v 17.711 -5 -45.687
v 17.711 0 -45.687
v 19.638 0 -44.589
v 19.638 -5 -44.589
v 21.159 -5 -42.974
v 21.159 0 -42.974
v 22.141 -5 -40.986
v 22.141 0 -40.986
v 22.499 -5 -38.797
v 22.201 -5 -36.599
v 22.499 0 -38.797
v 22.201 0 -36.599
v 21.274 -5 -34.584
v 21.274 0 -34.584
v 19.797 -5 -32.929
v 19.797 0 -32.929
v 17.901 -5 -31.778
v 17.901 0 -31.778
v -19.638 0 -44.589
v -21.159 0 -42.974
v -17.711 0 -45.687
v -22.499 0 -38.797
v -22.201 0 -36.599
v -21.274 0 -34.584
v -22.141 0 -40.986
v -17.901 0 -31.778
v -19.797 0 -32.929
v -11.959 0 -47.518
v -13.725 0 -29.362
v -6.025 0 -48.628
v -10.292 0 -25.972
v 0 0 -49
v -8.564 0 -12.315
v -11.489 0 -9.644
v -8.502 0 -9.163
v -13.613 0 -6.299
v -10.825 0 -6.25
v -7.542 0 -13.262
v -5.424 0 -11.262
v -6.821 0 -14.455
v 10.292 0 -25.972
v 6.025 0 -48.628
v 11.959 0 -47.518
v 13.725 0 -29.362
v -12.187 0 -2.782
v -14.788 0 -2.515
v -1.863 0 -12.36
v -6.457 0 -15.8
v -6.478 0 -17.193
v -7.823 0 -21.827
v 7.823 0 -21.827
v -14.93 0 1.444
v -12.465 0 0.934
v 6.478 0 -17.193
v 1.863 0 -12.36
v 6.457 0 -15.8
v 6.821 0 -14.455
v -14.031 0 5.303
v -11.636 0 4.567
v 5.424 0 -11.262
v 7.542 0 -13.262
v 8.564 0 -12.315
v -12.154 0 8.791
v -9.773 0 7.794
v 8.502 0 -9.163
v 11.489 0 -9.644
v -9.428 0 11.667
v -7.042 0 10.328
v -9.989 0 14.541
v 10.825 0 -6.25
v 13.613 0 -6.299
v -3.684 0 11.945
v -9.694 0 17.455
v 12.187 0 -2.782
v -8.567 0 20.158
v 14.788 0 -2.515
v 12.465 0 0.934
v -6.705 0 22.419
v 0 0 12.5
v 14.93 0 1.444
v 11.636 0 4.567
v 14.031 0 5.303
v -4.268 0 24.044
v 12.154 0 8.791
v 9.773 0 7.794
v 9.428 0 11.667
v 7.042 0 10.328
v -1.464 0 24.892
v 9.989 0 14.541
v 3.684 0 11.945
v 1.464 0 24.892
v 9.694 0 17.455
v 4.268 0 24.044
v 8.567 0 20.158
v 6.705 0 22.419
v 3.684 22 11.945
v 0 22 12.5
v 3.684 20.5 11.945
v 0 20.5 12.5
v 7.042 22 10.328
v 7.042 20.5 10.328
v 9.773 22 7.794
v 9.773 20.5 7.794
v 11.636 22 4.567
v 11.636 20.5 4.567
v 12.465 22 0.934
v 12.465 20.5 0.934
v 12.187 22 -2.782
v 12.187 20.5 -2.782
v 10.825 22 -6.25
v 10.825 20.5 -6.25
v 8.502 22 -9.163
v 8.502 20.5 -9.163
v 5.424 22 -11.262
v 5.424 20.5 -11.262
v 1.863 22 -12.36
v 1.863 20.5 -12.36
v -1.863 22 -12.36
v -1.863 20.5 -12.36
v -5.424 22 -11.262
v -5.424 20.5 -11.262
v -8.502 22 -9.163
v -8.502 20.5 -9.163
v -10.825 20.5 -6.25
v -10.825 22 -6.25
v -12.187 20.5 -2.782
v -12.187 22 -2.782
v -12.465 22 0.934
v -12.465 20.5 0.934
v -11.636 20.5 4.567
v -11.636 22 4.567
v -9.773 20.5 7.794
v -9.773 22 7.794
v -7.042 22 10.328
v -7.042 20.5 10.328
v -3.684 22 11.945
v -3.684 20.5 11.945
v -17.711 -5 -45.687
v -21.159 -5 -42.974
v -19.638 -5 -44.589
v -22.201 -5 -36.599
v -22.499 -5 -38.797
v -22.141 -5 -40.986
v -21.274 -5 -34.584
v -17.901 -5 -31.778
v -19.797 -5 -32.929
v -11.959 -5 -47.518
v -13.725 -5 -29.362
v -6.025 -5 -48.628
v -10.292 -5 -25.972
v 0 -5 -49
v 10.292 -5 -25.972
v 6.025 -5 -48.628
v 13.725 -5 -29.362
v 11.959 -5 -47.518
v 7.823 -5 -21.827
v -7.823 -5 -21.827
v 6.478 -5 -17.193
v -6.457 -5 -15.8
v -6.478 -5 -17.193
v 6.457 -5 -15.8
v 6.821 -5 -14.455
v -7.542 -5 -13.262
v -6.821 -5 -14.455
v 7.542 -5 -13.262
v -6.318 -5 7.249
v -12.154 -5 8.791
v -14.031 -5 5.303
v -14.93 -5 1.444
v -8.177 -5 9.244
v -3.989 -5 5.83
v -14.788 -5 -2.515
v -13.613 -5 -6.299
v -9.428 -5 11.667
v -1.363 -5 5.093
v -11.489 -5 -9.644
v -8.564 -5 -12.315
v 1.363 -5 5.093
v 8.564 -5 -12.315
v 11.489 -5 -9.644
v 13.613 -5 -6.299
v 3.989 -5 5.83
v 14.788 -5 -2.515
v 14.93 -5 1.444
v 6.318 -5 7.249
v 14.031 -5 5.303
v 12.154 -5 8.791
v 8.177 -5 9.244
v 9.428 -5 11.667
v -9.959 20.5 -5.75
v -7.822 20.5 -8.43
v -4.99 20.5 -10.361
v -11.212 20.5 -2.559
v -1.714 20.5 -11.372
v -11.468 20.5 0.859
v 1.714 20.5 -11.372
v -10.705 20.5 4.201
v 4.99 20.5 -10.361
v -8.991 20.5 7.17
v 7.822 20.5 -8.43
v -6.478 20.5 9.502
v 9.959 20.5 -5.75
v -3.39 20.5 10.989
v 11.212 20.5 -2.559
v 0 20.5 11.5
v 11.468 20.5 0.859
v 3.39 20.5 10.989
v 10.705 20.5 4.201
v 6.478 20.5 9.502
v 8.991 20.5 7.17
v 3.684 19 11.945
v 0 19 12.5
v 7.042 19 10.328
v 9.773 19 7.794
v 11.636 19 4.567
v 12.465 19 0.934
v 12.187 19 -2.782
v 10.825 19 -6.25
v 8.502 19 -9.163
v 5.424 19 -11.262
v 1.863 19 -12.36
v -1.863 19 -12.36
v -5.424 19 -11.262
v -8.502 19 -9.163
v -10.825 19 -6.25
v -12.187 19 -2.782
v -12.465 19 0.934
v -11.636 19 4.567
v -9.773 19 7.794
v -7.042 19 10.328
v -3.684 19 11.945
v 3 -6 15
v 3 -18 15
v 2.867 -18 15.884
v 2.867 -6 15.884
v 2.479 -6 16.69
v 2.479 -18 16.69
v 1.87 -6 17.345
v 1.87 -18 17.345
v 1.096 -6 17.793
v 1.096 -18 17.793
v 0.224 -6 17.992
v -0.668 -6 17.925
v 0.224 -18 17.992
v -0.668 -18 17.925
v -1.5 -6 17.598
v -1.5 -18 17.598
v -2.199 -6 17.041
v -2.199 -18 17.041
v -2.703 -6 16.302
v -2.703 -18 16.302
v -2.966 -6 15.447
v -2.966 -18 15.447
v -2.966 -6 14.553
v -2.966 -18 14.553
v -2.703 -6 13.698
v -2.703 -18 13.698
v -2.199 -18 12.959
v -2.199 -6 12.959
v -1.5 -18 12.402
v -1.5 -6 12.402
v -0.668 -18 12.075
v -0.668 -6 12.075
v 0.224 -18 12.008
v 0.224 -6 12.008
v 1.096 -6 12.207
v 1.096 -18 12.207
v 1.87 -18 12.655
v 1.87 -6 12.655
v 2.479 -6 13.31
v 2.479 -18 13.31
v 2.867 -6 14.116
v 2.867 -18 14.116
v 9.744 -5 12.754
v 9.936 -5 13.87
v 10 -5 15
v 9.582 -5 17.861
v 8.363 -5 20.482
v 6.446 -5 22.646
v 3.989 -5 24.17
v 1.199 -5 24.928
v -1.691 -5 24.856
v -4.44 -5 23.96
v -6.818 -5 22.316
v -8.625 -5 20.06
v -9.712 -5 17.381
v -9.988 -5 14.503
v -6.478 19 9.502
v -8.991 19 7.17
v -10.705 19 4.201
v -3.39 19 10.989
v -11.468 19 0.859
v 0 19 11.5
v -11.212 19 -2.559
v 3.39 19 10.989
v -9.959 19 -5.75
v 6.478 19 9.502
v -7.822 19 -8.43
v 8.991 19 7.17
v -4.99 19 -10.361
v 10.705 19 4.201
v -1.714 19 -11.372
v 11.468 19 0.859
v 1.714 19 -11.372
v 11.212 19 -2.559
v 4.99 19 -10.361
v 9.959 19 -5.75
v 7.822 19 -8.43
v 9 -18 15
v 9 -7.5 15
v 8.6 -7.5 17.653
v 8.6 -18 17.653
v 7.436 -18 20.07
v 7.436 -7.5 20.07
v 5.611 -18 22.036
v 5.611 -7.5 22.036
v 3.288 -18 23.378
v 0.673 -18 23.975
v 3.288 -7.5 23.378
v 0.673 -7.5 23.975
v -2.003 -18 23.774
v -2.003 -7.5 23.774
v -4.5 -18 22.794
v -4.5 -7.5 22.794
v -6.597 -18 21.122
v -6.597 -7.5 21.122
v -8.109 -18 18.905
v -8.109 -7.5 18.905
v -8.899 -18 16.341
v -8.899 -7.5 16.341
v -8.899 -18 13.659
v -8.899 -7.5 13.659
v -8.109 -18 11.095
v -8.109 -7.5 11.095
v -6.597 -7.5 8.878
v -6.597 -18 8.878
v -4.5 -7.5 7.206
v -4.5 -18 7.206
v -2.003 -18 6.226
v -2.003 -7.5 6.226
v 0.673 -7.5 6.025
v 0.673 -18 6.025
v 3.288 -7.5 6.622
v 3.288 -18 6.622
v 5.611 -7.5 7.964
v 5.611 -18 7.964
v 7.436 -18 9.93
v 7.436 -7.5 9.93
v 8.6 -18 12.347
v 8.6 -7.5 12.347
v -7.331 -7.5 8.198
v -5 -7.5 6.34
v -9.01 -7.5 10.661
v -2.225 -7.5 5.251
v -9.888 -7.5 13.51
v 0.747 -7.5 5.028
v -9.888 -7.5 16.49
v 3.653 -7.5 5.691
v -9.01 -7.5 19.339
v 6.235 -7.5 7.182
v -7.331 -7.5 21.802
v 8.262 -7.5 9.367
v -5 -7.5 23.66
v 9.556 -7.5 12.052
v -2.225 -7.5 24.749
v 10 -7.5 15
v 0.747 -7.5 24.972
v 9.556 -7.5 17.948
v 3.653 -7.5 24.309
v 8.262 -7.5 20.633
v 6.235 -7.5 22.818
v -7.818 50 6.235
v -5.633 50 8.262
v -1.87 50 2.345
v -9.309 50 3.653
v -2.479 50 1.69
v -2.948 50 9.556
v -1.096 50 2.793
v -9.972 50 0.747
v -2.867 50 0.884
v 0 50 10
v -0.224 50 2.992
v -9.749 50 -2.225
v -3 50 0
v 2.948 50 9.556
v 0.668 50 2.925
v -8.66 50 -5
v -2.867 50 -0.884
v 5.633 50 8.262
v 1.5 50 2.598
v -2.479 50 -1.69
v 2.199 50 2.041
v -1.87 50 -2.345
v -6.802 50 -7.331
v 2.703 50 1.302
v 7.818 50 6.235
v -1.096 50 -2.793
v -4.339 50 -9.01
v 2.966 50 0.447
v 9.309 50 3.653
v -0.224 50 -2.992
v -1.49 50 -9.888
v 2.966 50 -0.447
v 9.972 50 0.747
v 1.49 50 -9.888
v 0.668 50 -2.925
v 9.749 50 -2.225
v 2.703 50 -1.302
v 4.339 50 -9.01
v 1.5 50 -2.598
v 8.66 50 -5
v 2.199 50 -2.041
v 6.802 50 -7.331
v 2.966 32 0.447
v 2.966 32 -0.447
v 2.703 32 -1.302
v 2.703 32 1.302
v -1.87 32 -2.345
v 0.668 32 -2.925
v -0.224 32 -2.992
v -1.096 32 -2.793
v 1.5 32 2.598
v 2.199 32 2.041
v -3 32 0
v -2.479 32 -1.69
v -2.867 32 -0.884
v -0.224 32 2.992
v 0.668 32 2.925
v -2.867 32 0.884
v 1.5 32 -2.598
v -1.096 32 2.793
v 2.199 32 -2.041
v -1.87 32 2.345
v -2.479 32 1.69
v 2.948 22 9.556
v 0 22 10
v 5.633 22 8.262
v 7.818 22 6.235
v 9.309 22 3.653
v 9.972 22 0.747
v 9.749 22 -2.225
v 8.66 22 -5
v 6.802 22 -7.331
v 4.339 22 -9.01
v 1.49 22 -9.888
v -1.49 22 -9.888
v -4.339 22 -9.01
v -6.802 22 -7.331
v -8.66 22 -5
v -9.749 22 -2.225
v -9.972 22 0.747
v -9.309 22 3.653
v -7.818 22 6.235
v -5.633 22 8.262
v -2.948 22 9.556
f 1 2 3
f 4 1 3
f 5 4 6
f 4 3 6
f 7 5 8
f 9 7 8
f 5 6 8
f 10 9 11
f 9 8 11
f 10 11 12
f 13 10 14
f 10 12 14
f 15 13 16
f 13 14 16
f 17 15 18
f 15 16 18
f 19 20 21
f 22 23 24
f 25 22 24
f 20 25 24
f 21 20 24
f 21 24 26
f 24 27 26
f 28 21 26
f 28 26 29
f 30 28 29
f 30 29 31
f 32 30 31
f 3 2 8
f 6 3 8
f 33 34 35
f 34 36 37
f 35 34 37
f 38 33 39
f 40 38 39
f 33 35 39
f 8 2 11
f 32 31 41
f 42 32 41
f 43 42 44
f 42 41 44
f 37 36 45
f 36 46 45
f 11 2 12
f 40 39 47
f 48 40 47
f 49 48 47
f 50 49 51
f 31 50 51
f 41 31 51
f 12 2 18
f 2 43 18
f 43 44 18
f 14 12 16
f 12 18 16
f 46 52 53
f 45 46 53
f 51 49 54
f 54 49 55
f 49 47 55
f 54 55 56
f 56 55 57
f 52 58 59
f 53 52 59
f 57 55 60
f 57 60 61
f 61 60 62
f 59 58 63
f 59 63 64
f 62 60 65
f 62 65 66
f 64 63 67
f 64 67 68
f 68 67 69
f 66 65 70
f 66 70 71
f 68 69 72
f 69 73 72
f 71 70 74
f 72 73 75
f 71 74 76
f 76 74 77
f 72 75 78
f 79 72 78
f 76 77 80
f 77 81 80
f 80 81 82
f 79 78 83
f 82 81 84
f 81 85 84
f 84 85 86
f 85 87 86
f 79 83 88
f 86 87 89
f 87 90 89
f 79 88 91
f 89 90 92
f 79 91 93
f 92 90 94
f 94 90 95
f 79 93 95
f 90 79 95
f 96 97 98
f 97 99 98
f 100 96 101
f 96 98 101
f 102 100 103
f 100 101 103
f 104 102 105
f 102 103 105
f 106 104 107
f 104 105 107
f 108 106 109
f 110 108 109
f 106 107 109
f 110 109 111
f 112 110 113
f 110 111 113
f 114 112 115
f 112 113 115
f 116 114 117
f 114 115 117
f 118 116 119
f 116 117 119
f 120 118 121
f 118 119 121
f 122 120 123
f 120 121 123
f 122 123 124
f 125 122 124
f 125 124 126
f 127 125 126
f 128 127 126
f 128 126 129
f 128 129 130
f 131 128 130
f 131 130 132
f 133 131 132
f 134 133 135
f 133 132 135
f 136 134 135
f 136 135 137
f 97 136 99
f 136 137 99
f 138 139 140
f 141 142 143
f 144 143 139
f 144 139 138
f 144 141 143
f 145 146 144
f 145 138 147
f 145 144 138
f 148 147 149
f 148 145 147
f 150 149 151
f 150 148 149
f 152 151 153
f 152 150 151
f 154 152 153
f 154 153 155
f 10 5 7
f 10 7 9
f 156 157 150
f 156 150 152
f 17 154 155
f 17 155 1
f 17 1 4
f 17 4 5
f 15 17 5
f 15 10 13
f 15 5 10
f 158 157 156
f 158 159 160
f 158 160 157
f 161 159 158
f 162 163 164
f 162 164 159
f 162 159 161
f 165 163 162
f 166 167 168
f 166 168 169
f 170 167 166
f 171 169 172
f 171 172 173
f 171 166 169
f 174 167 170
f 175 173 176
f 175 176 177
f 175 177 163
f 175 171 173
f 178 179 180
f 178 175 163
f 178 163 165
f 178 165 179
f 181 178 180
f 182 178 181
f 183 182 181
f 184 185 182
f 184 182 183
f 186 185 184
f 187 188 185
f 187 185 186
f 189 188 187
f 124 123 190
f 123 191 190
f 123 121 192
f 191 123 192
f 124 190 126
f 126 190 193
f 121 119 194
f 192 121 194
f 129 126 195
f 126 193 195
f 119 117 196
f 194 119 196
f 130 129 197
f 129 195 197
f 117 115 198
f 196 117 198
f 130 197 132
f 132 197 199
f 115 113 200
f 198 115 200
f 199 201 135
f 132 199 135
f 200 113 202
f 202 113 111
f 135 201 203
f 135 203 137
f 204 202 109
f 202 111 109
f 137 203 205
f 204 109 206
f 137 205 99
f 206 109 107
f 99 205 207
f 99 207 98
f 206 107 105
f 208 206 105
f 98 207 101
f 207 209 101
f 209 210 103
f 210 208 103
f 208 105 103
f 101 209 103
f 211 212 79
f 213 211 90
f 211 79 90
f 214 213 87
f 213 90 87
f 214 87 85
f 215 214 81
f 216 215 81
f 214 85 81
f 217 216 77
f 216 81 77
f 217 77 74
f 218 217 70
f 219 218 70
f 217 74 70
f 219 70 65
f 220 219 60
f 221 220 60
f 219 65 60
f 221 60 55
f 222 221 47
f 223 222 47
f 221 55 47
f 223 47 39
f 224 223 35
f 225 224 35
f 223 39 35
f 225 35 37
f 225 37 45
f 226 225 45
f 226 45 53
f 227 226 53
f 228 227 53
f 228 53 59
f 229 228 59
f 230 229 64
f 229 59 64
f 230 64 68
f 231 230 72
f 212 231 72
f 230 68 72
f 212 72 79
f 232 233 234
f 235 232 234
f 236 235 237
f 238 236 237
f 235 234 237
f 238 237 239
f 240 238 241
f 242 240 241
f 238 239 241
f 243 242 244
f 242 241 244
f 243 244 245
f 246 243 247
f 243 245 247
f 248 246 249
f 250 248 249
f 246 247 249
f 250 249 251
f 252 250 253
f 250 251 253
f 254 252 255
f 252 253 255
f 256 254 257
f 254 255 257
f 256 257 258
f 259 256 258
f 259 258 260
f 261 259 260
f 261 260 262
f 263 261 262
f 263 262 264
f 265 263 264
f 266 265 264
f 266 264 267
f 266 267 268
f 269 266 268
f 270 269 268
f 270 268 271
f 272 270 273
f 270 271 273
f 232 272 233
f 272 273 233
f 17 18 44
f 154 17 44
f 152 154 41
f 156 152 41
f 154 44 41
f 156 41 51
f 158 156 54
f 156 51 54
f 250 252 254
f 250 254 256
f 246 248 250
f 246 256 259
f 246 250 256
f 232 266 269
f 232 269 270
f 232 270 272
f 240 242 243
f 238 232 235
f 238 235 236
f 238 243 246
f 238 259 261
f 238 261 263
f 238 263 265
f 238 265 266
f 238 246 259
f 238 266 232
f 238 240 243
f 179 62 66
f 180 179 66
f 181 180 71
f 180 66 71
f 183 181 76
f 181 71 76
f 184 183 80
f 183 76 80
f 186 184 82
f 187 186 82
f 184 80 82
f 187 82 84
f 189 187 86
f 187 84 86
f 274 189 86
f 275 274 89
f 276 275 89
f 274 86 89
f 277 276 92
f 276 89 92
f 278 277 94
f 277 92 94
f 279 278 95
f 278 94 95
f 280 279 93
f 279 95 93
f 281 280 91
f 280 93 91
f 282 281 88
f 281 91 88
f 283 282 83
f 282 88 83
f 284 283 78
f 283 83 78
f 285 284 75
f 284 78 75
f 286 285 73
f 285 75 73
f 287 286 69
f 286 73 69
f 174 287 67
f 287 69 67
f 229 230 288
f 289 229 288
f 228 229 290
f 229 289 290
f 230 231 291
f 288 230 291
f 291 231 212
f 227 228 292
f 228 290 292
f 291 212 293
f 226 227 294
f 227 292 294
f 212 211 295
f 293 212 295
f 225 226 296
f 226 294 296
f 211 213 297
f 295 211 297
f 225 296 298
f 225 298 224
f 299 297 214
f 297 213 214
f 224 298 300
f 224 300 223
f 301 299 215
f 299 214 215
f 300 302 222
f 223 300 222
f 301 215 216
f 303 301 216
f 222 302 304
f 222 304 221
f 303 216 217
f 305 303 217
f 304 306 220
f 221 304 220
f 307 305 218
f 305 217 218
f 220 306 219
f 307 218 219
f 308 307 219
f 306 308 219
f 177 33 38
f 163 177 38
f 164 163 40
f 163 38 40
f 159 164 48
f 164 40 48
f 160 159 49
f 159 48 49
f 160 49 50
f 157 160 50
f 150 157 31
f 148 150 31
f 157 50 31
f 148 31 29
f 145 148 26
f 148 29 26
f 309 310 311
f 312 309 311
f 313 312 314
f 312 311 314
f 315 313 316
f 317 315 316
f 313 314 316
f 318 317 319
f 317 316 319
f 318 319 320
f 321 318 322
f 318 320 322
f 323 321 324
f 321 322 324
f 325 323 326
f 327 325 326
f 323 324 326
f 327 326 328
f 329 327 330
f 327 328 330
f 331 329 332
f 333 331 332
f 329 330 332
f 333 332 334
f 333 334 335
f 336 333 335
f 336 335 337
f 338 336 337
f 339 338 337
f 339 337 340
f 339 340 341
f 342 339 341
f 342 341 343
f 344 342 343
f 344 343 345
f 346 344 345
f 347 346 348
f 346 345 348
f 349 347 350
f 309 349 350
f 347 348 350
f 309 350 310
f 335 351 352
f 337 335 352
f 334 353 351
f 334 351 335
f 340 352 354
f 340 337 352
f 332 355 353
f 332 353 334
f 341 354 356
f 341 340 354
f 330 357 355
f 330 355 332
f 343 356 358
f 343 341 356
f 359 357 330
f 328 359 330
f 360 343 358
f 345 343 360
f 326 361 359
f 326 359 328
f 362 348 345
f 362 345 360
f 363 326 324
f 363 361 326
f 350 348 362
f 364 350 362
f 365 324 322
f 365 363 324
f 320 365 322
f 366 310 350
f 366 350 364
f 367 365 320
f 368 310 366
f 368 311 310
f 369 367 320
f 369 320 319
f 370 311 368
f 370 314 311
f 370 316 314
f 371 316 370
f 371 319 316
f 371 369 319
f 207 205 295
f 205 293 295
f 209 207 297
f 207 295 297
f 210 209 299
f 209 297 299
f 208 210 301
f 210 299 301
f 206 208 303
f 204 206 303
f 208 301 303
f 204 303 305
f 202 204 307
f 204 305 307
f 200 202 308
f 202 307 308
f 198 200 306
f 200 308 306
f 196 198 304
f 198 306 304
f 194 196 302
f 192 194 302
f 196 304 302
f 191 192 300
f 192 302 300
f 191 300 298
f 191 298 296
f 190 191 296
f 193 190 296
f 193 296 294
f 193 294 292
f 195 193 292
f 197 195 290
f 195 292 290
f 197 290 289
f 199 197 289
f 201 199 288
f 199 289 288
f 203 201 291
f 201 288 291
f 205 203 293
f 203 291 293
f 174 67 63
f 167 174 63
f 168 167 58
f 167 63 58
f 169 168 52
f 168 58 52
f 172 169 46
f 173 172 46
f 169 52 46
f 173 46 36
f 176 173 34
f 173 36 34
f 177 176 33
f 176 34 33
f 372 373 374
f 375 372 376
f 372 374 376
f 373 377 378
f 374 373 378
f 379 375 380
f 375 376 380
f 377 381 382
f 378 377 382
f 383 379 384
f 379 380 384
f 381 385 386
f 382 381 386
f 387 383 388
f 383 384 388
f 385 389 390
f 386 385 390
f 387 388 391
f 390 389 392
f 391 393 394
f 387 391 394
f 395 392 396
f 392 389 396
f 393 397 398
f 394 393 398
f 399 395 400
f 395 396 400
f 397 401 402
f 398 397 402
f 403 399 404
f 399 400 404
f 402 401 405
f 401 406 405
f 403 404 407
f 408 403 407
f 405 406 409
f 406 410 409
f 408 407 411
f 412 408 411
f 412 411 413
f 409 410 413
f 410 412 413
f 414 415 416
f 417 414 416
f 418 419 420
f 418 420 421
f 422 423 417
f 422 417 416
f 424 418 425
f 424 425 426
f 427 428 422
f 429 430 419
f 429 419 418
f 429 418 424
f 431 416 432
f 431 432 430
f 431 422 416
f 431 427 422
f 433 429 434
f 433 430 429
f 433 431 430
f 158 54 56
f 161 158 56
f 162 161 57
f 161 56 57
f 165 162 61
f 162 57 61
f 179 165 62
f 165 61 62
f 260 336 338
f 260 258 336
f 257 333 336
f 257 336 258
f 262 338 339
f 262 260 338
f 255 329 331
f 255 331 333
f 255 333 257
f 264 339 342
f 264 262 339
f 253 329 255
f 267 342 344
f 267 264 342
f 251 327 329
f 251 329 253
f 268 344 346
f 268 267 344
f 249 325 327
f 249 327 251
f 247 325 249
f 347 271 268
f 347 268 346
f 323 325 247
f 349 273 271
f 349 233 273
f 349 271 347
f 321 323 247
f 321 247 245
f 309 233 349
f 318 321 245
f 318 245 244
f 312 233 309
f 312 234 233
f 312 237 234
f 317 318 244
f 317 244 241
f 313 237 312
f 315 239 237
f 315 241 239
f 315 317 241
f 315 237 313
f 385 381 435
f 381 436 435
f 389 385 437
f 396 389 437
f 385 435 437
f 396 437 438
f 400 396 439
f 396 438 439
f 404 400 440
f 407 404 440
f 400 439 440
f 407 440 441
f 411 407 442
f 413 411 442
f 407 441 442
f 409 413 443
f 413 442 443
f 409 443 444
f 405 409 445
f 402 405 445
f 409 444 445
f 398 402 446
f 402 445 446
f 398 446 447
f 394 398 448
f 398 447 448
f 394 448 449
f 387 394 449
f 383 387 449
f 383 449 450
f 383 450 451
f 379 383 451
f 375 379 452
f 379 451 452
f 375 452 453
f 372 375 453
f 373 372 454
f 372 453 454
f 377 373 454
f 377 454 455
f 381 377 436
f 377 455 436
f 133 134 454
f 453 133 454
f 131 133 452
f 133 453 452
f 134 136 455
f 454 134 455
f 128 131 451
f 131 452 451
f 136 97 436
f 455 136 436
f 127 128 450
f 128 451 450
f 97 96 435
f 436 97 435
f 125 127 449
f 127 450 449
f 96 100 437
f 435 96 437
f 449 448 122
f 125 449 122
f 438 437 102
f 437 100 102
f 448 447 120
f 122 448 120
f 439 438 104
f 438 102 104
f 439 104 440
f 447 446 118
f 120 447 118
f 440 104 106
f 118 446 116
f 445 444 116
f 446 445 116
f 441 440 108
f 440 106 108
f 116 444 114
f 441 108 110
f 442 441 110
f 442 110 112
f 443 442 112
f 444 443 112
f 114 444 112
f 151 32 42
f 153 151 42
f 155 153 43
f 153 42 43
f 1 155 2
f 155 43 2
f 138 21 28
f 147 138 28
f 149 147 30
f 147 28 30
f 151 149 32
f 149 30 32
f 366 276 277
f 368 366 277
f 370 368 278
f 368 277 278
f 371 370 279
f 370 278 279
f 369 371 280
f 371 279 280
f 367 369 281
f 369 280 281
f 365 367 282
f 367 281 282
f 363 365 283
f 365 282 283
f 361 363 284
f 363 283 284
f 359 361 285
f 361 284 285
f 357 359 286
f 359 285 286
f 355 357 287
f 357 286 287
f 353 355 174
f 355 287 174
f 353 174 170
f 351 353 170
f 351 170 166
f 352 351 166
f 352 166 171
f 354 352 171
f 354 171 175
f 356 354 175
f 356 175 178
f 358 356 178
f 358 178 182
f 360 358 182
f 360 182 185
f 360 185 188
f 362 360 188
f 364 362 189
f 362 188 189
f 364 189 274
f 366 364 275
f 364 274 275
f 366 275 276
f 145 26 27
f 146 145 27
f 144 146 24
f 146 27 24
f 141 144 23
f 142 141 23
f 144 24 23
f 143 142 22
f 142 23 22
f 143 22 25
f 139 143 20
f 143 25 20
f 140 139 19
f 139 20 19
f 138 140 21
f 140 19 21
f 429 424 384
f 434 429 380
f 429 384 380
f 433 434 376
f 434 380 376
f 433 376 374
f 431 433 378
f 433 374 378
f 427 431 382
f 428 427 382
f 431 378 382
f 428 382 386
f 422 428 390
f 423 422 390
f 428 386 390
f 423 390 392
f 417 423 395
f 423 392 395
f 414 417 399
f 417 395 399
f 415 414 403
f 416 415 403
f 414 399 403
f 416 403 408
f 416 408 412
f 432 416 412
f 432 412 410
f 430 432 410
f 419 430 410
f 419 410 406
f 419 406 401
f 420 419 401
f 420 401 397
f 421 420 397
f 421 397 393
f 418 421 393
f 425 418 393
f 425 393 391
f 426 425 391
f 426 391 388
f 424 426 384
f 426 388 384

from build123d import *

# Parameters (mm, degrees)
F3_DEPTH  = 5
F4_R      = 10
F5_DEPTH  = 2.5
F6_R      = 9
F7_DEPTH  = 10.5
F8_R      = 3
F9_DEPTH  = 12
F10_R     = 3
F11_DEPTH = 18


with BuildPart() as f1:
    # F0 (on Right) → F1 (revolve)
    with BuildSketch(Plane.YZ):
        Polygon((19, 12.5), (0, 12.5), (0, 0), (50, 0), (50, 10), (22, 10), (22, 12.5), (20.5, 12.5), (20.5, 11.5), (19, 11.5), align=None)
    revolve(axis=Axis((0, 25, 0), (0, 1, 0)))

    # F2 (on Front) → F3 (join)
    with BuildSketch(Plane.XZ):
        with BuildLine():
            ThreePointArc((9.4280904158, 11.6666666667), (0, 25), (-9.4280904158, 11.6666666667))
            ThreePointArc((-9.4280904158, 11.6666666667), (-14.9902642074, -0.5403508046), (-8.5636209064, -12.3152099849))
            ThreePointArc((-8.5636209064, -12.3152099849), (-6.8207164782, -14.4547006883), (-6.478218783, -17.1929175614))
            ThreePointArc((-6.478218783, -17.1929175614), (-10.2915186174, -25.9720061348), (-17.9009433962, -31.7780638628))
            ThreePointArc((-17.9009433962, -31.7780638628), (-22.4992996252, -38.7968093702), (-17.7108433735, -45.6872632908))
            ThreePointArc((-17.7108433735, -45.6872632908), (-9.0089982449, -48.1646961023), (0, -49))
            ThreePointArc((0, -49), (9.0089982449, -48.1646961023), (17.7108433735, -45.6872632908))
            ThreePointArc((17.7108433735, -45.6872632908), (22.4992996252, -38.7968093702), (17.9009433962, -31.7780638628))
            ThreePointArc((17.9009433962, -31.7780638628), (10.2915186174, -25.9720061348), (6.478218783, -17.1929175614))
            ThreePointArc((6.478218783, -17.1929175614), (6.8207164782, -14.4547006883), (8.5636209064, -12.3152099849))
            ThreePointArc((8.5636209064, -12.3152099849), (14.9902642074, -0.5403508046), (9.4280904158, 11.6666666667))
        make_face()
    extrude(amount=F3_DEPTH)

    # F4 (on face) → F5 (join)
    with BuildSketch(Plane.XZ.offset(5)):
        with Locations((0, 15)):
            Circle(F4_R)
    extrude(amount=F5_DEPTH)

    # F6 (on face) → F7 (join)
    with BuildSketch(Plane.XZ.offset(7.5)):
        with Locations((0, 15)):
            Circle(F6_R)
    extrude(amount=F7_DEPTH)

    # F8 (on face) → F9 (cut)
    with BuildSketch(Plane.XZ.offset(18)):
        with Locations((0, 15)):
            Circle(F8_R)
    extrude(amount=-F9_DEPTH, mode=Mode.SUBTRACT)

    # F10 (on face) → F11 (cut)
    with BuildSketch(Plane(origin=(0, 50, 0), x_dir=(-1, 0, 0), z_dir=(0, 1, 0))):
        Circle(F10_R)
    extrude(amount=-F11_DEPTH, mode=Mode.SUBTRACT)


solid = f1.part
